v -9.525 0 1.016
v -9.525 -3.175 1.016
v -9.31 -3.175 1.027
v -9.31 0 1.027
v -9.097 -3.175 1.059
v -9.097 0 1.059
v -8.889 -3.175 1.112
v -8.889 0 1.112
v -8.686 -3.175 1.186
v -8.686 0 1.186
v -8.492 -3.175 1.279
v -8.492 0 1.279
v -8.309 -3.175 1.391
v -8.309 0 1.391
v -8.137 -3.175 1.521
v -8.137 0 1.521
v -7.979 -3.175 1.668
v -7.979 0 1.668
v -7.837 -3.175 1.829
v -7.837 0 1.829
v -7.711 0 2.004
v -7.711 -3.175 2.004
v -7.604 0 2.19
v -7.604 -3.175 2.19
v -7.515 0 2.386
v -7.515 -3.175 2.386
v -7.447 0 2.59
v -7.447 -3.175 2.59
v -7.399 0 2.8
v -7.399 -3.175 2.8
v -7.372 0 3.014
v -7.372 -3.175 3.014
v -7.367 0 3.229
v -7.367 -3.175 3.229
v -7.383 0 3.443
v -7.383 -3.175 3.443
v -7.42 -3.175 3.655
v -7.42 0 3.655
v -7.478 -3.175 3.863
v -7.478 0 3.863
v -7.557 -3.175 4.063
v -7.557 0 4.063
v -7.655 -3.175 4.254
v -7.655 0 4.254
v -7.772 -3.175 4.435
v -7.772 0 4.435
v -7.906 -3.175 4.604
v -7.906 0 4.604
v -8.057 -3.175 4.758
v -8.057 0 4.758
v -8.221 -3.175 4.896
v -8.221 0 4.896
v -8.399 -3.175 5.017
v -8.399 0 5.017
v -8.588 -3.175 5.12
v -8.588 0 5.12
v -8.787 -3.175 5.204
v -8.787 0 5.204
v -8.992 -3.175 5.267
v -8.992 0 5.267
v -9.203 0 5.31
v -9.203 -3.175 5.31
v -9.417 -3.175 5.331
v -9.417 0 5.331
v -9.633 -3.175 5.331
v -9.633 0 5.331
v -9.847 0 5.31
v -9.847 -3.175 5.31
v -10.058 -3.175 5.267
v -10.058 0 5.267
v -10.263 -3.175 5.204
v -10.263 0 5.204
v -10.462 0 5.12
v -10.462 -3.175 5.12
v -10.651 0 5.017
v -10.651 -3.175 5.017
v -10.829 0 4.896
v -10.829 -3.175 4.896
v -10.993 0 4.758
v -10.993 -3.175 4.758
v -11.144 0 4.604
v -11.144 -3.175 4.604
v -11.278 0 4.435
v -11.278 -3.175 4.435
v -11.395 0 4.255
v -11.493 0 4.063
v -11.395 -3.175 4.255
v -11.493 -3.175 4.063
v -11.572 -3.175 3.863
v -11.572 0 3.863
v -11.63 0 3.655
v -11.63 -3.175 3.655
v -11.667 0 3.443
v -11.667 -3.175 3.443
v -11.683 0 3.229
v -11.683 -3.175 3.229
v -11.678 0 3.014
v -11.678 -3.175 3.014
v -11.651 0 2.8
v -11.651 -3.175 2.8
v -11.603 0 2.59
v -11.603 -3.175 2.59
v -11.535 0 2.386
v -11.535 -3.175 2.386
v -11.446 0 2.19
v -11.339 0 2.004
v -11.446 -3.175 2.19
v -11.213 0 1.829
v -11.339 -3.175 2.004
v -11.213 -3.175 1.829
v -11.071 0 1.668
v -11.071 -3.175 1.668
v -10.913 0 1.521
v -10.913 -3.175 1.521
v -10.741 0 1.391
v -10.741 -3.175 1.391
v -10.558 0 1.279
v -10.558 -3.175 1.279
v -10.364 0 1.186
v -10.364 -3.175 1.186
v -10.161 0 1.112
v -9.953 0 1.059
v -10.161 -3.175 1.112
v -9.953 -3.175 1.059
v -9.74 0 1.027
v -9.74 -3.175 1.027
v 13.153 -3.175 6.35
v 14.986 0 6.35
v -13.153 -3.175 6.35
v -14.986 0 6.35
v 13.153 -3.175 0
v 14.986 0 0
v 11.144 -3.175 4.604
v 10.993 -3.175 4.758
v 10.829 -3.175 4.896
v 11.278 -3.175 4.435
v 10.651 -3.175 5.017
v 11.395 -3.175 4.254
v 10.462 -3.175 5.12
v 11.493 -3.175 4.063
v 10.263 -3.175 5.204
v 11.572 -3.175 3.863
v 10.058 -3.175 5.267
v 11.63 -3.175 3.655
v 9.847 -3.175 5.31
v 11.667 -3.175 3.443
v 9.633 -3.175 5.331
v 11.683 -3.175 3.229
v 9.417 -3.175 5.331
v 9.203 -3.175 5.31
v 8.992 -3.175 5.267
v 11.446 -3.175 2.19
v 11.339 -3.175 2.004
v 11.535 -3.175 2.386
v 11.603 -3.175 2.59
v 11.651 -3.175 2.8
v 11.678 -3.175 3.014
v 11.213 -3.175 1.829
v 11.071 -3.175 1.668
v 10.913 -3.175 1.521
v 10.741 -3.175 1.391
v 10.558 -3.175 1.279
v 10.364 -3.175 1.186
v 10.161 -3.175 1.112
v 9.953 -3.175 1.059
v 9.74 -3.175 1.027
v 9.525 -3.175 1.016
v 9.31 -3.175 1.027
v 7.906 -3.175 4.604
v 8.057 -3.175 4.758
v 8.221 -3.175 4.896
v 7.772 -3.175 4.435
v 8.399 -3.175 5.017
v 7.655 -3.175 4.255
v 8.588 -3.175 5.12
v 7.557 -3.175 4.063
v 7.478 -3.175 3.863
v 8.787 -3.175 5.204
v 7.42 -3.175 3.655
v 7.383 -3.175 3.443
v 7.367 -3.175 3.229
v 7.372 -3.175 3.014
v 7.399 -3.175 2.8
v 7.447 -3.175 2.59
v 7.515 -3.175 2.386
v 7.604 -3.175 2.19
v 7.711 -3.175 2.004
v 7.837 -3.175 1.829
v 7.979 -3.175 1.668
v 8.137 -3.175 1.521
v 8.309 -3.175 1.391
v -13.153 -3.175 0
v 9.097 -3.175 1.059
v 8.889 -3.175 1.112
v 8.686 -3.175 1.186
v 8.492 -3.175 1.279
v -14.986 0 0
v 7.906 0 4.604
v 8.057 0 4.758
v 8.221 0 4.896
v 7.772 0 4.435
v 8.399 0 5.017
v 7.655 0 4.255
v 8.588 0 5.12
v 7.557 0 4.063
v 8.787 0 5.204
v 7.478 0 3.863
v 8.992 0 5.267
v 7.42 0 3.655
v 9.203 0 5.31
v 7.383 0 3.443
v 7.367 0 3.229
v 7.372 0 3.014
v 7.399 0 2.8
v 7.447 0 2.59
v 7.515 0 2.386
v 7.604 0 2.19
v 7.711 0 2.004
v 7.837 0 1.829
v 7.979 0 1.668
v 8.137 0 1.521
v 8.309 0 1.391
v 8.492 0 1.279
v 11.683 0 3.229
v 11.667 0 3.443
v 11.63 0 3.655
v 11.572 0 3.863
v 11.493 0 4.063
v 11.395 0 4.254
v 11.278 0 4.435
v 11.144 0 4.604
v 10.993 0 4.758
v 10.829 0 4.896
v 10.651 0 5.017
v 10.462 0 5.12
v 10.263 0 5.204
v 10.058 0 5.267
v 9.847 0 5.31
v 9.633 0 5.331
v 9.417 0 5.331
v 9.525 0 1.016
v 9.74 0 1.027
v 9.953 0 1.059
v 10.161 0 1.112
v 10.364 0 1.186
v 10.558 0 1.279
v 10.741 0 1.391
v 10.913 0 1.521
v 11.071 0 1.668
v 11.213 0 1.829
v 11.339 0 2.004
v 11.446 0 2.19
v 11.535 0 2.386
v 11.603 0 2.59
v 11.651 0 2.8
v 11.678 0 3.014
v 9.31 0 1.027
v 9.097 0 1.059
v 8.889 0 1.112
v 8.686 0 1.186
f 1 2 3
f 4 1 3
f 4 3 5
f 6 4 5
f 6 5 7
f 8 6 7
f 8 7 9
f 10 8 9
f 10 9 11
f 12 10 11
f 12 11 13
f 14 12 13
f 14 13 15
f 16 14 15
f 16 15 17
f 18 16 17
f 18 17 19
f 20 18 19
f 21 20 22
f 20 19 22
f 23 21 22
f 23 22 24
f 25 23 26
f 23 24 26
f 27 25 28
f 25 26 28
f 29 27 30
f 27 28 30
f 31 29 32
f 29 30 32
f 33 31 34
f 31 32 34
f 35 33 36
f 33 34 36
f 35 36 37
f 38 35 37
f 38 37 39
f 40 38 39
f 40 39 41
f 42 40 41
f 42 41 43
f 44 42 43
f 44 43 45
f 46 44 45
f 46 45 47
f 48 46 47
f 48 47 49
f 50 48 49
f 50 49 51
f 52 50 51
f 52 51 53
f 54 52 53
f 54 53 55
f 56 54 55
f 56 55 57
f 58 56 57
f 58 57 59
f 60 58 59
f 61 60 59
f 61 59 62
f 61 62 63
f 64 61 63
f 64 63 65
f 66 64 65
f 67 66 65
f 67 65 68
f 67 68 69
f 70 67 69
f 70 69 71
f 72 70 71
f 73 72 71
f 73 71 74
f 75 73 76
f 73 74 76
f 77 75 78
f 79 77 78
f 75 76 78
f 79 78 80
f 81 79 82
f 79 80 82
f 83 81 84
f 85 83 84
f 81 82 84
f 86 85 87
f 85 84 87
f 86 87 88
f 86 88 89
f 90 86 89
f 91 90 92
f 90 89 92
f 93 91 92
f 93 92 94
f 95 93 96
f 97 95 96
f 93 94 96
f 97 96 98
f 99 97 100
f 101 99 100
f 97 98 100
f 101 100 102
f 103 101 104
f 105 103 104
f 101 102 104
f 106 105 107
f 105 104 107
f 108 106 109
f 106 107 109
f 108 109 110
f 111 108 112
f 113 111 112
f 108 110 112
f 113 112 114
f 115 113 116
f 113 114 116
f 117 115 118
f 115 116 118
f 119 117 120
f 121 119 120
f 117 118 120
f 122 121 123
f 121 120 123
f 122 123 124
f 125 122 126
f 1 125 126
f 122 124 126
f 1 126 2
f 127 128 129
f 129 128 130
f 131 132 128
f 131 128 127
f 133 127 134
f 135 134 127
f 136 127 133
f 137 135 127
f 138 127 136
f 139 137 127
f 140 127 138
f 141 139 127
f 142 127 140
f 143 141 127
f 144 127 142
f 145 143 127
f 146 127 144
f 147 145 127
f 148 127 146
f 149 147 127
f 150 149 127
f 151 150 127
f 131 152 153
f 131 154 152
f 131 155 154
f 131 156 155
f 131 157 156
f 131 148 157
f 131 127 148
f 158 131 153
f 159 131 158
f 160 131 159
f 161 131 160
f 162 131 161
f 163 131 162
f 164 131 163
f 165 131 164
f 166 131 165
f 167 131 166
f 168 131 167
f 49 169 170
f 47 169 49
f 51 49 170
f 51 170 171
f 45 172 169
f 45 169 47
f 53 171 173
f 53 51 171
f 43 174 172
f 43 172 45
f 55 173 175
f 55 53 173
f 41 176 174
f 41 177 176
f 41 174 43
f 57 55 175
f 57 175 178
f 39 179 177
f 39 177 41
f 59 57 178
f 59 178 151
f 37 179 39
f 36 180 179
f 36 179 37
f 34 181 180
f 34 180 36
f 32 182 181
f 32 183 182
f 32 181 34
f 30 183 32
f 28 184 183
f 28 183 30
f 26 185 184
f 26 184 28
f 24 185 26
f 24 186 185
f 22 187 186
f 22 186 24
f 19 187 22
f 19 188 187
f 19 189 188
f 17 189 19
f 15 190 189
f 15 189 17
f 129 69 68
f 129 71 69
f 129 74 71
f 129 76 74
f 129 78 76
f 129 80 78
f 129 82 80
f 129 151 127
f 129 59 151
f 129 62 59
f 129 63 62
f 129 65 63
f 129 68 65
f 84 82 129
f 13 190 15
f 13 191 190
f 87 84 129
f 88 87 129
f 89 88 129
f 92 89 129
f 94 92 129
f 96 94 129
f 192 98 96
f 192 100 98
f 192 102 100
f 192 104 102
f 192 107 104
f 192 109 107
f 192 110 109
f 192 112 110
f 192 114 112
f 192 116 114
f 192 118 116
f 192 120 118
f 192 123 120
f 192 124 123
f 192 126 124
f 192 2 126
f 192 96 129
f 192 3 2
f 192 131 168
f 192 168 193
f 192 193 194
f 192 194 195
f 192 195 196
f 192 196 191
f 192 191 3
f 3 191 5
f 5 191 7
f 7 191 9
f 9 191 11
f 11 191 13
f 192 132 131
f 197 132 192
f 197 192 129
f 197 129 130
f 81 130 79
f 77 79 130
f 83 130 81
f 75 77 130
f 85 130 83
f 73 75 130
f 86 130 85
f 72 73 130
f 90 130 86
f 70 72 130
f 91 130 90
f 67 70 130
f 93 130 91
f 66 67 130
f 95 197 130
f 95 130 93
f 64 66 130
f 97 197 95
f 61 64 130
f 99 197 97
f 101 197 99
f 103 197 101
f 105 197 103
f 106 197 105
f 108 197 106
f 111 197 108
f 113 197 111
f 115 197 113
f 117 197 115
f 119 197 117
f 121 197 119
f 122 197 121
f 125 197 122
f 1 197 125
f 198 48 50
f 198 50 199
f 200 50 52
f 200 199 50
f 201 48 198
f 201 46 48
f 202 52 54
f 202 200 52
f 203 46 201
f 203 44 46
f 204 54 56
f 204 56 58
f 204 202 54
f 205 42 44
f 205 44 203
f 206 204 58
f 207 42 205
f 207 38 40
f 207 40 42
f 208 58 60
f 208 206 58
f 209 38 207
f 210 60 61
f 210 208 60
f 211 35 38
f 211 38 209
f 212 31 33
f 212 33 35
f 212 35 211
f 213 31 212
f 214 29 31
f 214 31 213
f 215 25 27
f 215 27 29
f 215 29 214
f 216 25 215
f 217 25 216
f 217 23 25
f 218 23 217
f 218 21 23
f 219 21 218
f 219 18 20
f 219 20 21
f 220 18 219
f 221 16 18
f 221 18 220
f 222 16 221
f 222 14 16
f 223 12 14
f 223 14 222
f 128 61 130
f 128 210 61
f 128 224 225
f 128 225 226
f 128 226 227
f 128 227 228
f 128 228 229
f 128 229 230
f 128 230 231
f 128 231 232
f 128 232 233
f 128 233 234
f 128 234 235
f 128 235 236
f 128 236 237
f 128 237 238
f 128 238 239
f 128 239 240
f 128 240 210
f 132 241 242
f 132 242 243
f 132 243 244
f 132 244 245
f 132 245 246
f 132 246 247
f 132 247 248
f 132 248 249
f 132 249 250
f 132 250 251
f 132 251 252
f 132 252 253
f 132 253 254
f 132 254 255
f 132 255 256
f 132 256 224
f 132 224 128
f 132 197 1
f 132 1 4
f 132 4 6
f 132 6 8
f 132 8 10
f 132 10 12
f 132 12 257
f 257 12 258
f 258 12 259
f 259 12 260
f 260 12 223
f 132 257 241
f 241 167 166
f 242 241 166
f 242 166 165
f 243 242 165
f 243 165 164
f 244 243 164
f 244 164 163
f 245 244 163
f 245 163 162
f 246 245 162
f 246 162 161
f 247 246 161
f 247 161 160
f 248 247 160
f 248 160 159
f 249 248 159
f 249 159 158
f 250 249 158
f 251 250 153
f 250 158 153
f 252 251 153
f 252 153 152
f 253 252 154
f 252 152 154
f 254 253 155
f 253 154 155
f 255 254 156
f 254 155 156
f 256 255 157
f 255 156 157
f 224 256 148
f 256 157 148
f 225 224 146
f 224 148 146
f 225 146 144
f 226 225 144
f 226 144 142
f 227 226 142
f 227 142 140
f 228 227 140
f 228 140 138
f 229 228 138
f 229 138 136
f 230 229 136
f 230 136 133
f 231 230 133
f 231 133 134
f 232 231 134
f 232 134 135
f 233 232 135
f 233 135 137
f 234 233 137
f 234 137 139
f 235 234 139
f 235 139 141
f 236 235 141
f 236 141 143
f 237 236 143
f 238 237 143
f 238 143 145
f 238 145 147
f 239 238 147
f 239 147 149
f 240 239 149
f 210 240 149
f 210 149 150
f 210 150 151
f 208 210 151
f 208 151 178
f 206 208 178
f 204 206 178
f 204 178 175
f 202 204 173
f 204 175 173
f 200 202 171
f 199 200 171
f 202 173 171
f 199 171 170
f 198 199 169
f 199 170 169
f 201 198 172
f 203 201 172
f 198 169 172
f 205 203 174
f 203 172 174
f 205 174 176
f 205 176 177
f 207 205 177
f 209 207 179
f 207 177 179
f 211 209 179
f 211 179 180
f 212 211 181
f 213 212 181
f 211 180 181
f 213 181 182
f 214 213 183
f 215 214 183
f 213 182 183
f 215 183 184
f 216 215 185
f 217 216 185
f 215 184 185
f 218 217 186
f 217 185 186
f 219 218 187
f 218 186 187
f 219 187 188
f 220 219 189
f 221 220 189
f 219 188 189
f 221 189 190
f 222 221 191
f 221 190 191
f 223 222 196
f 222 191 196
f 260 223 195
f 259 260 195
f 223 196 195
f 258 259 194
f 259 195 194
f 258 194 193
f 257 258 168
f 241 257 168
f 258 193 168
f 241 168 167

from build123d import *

# Parameters (mm, degrees)
BOSS_EXTRUDE1_DEPTH = 6.35
SKETCH2_R           = 2.159
CUT_EXTRUDE1_DEPTH  = 5.08


with BuildPart() as part:
    # Sketch1 → Boss-Extrude1 (new body)
    with BuildSketch(Plane.XY):
        Polygon((-14.986, 0), (14.986, 0), (13.152912895, -3.175), (-13.152912895, -3.175), align=None)
    extrude(amount=BOSS_EXTRUDE1_DEPTH)

    # Sketch2 → Cut-Extrude1 (cut)
    with BuildSketch(Plane.XZ.offset(3.175)):
        with Locations(Location((-9.525, 3.175, 0), (0, 0, 270))):
            Circle(SKETCH2_R)
        with Locations(Location((9.525, 3.175, 0), (0, 0, 270))):
            Circle(SKETCH2_R)
    extrude(amount=-CUT_EXTRUDE1_DEPTH, mode=Mode.SUBTRACT)


solid = part.part
